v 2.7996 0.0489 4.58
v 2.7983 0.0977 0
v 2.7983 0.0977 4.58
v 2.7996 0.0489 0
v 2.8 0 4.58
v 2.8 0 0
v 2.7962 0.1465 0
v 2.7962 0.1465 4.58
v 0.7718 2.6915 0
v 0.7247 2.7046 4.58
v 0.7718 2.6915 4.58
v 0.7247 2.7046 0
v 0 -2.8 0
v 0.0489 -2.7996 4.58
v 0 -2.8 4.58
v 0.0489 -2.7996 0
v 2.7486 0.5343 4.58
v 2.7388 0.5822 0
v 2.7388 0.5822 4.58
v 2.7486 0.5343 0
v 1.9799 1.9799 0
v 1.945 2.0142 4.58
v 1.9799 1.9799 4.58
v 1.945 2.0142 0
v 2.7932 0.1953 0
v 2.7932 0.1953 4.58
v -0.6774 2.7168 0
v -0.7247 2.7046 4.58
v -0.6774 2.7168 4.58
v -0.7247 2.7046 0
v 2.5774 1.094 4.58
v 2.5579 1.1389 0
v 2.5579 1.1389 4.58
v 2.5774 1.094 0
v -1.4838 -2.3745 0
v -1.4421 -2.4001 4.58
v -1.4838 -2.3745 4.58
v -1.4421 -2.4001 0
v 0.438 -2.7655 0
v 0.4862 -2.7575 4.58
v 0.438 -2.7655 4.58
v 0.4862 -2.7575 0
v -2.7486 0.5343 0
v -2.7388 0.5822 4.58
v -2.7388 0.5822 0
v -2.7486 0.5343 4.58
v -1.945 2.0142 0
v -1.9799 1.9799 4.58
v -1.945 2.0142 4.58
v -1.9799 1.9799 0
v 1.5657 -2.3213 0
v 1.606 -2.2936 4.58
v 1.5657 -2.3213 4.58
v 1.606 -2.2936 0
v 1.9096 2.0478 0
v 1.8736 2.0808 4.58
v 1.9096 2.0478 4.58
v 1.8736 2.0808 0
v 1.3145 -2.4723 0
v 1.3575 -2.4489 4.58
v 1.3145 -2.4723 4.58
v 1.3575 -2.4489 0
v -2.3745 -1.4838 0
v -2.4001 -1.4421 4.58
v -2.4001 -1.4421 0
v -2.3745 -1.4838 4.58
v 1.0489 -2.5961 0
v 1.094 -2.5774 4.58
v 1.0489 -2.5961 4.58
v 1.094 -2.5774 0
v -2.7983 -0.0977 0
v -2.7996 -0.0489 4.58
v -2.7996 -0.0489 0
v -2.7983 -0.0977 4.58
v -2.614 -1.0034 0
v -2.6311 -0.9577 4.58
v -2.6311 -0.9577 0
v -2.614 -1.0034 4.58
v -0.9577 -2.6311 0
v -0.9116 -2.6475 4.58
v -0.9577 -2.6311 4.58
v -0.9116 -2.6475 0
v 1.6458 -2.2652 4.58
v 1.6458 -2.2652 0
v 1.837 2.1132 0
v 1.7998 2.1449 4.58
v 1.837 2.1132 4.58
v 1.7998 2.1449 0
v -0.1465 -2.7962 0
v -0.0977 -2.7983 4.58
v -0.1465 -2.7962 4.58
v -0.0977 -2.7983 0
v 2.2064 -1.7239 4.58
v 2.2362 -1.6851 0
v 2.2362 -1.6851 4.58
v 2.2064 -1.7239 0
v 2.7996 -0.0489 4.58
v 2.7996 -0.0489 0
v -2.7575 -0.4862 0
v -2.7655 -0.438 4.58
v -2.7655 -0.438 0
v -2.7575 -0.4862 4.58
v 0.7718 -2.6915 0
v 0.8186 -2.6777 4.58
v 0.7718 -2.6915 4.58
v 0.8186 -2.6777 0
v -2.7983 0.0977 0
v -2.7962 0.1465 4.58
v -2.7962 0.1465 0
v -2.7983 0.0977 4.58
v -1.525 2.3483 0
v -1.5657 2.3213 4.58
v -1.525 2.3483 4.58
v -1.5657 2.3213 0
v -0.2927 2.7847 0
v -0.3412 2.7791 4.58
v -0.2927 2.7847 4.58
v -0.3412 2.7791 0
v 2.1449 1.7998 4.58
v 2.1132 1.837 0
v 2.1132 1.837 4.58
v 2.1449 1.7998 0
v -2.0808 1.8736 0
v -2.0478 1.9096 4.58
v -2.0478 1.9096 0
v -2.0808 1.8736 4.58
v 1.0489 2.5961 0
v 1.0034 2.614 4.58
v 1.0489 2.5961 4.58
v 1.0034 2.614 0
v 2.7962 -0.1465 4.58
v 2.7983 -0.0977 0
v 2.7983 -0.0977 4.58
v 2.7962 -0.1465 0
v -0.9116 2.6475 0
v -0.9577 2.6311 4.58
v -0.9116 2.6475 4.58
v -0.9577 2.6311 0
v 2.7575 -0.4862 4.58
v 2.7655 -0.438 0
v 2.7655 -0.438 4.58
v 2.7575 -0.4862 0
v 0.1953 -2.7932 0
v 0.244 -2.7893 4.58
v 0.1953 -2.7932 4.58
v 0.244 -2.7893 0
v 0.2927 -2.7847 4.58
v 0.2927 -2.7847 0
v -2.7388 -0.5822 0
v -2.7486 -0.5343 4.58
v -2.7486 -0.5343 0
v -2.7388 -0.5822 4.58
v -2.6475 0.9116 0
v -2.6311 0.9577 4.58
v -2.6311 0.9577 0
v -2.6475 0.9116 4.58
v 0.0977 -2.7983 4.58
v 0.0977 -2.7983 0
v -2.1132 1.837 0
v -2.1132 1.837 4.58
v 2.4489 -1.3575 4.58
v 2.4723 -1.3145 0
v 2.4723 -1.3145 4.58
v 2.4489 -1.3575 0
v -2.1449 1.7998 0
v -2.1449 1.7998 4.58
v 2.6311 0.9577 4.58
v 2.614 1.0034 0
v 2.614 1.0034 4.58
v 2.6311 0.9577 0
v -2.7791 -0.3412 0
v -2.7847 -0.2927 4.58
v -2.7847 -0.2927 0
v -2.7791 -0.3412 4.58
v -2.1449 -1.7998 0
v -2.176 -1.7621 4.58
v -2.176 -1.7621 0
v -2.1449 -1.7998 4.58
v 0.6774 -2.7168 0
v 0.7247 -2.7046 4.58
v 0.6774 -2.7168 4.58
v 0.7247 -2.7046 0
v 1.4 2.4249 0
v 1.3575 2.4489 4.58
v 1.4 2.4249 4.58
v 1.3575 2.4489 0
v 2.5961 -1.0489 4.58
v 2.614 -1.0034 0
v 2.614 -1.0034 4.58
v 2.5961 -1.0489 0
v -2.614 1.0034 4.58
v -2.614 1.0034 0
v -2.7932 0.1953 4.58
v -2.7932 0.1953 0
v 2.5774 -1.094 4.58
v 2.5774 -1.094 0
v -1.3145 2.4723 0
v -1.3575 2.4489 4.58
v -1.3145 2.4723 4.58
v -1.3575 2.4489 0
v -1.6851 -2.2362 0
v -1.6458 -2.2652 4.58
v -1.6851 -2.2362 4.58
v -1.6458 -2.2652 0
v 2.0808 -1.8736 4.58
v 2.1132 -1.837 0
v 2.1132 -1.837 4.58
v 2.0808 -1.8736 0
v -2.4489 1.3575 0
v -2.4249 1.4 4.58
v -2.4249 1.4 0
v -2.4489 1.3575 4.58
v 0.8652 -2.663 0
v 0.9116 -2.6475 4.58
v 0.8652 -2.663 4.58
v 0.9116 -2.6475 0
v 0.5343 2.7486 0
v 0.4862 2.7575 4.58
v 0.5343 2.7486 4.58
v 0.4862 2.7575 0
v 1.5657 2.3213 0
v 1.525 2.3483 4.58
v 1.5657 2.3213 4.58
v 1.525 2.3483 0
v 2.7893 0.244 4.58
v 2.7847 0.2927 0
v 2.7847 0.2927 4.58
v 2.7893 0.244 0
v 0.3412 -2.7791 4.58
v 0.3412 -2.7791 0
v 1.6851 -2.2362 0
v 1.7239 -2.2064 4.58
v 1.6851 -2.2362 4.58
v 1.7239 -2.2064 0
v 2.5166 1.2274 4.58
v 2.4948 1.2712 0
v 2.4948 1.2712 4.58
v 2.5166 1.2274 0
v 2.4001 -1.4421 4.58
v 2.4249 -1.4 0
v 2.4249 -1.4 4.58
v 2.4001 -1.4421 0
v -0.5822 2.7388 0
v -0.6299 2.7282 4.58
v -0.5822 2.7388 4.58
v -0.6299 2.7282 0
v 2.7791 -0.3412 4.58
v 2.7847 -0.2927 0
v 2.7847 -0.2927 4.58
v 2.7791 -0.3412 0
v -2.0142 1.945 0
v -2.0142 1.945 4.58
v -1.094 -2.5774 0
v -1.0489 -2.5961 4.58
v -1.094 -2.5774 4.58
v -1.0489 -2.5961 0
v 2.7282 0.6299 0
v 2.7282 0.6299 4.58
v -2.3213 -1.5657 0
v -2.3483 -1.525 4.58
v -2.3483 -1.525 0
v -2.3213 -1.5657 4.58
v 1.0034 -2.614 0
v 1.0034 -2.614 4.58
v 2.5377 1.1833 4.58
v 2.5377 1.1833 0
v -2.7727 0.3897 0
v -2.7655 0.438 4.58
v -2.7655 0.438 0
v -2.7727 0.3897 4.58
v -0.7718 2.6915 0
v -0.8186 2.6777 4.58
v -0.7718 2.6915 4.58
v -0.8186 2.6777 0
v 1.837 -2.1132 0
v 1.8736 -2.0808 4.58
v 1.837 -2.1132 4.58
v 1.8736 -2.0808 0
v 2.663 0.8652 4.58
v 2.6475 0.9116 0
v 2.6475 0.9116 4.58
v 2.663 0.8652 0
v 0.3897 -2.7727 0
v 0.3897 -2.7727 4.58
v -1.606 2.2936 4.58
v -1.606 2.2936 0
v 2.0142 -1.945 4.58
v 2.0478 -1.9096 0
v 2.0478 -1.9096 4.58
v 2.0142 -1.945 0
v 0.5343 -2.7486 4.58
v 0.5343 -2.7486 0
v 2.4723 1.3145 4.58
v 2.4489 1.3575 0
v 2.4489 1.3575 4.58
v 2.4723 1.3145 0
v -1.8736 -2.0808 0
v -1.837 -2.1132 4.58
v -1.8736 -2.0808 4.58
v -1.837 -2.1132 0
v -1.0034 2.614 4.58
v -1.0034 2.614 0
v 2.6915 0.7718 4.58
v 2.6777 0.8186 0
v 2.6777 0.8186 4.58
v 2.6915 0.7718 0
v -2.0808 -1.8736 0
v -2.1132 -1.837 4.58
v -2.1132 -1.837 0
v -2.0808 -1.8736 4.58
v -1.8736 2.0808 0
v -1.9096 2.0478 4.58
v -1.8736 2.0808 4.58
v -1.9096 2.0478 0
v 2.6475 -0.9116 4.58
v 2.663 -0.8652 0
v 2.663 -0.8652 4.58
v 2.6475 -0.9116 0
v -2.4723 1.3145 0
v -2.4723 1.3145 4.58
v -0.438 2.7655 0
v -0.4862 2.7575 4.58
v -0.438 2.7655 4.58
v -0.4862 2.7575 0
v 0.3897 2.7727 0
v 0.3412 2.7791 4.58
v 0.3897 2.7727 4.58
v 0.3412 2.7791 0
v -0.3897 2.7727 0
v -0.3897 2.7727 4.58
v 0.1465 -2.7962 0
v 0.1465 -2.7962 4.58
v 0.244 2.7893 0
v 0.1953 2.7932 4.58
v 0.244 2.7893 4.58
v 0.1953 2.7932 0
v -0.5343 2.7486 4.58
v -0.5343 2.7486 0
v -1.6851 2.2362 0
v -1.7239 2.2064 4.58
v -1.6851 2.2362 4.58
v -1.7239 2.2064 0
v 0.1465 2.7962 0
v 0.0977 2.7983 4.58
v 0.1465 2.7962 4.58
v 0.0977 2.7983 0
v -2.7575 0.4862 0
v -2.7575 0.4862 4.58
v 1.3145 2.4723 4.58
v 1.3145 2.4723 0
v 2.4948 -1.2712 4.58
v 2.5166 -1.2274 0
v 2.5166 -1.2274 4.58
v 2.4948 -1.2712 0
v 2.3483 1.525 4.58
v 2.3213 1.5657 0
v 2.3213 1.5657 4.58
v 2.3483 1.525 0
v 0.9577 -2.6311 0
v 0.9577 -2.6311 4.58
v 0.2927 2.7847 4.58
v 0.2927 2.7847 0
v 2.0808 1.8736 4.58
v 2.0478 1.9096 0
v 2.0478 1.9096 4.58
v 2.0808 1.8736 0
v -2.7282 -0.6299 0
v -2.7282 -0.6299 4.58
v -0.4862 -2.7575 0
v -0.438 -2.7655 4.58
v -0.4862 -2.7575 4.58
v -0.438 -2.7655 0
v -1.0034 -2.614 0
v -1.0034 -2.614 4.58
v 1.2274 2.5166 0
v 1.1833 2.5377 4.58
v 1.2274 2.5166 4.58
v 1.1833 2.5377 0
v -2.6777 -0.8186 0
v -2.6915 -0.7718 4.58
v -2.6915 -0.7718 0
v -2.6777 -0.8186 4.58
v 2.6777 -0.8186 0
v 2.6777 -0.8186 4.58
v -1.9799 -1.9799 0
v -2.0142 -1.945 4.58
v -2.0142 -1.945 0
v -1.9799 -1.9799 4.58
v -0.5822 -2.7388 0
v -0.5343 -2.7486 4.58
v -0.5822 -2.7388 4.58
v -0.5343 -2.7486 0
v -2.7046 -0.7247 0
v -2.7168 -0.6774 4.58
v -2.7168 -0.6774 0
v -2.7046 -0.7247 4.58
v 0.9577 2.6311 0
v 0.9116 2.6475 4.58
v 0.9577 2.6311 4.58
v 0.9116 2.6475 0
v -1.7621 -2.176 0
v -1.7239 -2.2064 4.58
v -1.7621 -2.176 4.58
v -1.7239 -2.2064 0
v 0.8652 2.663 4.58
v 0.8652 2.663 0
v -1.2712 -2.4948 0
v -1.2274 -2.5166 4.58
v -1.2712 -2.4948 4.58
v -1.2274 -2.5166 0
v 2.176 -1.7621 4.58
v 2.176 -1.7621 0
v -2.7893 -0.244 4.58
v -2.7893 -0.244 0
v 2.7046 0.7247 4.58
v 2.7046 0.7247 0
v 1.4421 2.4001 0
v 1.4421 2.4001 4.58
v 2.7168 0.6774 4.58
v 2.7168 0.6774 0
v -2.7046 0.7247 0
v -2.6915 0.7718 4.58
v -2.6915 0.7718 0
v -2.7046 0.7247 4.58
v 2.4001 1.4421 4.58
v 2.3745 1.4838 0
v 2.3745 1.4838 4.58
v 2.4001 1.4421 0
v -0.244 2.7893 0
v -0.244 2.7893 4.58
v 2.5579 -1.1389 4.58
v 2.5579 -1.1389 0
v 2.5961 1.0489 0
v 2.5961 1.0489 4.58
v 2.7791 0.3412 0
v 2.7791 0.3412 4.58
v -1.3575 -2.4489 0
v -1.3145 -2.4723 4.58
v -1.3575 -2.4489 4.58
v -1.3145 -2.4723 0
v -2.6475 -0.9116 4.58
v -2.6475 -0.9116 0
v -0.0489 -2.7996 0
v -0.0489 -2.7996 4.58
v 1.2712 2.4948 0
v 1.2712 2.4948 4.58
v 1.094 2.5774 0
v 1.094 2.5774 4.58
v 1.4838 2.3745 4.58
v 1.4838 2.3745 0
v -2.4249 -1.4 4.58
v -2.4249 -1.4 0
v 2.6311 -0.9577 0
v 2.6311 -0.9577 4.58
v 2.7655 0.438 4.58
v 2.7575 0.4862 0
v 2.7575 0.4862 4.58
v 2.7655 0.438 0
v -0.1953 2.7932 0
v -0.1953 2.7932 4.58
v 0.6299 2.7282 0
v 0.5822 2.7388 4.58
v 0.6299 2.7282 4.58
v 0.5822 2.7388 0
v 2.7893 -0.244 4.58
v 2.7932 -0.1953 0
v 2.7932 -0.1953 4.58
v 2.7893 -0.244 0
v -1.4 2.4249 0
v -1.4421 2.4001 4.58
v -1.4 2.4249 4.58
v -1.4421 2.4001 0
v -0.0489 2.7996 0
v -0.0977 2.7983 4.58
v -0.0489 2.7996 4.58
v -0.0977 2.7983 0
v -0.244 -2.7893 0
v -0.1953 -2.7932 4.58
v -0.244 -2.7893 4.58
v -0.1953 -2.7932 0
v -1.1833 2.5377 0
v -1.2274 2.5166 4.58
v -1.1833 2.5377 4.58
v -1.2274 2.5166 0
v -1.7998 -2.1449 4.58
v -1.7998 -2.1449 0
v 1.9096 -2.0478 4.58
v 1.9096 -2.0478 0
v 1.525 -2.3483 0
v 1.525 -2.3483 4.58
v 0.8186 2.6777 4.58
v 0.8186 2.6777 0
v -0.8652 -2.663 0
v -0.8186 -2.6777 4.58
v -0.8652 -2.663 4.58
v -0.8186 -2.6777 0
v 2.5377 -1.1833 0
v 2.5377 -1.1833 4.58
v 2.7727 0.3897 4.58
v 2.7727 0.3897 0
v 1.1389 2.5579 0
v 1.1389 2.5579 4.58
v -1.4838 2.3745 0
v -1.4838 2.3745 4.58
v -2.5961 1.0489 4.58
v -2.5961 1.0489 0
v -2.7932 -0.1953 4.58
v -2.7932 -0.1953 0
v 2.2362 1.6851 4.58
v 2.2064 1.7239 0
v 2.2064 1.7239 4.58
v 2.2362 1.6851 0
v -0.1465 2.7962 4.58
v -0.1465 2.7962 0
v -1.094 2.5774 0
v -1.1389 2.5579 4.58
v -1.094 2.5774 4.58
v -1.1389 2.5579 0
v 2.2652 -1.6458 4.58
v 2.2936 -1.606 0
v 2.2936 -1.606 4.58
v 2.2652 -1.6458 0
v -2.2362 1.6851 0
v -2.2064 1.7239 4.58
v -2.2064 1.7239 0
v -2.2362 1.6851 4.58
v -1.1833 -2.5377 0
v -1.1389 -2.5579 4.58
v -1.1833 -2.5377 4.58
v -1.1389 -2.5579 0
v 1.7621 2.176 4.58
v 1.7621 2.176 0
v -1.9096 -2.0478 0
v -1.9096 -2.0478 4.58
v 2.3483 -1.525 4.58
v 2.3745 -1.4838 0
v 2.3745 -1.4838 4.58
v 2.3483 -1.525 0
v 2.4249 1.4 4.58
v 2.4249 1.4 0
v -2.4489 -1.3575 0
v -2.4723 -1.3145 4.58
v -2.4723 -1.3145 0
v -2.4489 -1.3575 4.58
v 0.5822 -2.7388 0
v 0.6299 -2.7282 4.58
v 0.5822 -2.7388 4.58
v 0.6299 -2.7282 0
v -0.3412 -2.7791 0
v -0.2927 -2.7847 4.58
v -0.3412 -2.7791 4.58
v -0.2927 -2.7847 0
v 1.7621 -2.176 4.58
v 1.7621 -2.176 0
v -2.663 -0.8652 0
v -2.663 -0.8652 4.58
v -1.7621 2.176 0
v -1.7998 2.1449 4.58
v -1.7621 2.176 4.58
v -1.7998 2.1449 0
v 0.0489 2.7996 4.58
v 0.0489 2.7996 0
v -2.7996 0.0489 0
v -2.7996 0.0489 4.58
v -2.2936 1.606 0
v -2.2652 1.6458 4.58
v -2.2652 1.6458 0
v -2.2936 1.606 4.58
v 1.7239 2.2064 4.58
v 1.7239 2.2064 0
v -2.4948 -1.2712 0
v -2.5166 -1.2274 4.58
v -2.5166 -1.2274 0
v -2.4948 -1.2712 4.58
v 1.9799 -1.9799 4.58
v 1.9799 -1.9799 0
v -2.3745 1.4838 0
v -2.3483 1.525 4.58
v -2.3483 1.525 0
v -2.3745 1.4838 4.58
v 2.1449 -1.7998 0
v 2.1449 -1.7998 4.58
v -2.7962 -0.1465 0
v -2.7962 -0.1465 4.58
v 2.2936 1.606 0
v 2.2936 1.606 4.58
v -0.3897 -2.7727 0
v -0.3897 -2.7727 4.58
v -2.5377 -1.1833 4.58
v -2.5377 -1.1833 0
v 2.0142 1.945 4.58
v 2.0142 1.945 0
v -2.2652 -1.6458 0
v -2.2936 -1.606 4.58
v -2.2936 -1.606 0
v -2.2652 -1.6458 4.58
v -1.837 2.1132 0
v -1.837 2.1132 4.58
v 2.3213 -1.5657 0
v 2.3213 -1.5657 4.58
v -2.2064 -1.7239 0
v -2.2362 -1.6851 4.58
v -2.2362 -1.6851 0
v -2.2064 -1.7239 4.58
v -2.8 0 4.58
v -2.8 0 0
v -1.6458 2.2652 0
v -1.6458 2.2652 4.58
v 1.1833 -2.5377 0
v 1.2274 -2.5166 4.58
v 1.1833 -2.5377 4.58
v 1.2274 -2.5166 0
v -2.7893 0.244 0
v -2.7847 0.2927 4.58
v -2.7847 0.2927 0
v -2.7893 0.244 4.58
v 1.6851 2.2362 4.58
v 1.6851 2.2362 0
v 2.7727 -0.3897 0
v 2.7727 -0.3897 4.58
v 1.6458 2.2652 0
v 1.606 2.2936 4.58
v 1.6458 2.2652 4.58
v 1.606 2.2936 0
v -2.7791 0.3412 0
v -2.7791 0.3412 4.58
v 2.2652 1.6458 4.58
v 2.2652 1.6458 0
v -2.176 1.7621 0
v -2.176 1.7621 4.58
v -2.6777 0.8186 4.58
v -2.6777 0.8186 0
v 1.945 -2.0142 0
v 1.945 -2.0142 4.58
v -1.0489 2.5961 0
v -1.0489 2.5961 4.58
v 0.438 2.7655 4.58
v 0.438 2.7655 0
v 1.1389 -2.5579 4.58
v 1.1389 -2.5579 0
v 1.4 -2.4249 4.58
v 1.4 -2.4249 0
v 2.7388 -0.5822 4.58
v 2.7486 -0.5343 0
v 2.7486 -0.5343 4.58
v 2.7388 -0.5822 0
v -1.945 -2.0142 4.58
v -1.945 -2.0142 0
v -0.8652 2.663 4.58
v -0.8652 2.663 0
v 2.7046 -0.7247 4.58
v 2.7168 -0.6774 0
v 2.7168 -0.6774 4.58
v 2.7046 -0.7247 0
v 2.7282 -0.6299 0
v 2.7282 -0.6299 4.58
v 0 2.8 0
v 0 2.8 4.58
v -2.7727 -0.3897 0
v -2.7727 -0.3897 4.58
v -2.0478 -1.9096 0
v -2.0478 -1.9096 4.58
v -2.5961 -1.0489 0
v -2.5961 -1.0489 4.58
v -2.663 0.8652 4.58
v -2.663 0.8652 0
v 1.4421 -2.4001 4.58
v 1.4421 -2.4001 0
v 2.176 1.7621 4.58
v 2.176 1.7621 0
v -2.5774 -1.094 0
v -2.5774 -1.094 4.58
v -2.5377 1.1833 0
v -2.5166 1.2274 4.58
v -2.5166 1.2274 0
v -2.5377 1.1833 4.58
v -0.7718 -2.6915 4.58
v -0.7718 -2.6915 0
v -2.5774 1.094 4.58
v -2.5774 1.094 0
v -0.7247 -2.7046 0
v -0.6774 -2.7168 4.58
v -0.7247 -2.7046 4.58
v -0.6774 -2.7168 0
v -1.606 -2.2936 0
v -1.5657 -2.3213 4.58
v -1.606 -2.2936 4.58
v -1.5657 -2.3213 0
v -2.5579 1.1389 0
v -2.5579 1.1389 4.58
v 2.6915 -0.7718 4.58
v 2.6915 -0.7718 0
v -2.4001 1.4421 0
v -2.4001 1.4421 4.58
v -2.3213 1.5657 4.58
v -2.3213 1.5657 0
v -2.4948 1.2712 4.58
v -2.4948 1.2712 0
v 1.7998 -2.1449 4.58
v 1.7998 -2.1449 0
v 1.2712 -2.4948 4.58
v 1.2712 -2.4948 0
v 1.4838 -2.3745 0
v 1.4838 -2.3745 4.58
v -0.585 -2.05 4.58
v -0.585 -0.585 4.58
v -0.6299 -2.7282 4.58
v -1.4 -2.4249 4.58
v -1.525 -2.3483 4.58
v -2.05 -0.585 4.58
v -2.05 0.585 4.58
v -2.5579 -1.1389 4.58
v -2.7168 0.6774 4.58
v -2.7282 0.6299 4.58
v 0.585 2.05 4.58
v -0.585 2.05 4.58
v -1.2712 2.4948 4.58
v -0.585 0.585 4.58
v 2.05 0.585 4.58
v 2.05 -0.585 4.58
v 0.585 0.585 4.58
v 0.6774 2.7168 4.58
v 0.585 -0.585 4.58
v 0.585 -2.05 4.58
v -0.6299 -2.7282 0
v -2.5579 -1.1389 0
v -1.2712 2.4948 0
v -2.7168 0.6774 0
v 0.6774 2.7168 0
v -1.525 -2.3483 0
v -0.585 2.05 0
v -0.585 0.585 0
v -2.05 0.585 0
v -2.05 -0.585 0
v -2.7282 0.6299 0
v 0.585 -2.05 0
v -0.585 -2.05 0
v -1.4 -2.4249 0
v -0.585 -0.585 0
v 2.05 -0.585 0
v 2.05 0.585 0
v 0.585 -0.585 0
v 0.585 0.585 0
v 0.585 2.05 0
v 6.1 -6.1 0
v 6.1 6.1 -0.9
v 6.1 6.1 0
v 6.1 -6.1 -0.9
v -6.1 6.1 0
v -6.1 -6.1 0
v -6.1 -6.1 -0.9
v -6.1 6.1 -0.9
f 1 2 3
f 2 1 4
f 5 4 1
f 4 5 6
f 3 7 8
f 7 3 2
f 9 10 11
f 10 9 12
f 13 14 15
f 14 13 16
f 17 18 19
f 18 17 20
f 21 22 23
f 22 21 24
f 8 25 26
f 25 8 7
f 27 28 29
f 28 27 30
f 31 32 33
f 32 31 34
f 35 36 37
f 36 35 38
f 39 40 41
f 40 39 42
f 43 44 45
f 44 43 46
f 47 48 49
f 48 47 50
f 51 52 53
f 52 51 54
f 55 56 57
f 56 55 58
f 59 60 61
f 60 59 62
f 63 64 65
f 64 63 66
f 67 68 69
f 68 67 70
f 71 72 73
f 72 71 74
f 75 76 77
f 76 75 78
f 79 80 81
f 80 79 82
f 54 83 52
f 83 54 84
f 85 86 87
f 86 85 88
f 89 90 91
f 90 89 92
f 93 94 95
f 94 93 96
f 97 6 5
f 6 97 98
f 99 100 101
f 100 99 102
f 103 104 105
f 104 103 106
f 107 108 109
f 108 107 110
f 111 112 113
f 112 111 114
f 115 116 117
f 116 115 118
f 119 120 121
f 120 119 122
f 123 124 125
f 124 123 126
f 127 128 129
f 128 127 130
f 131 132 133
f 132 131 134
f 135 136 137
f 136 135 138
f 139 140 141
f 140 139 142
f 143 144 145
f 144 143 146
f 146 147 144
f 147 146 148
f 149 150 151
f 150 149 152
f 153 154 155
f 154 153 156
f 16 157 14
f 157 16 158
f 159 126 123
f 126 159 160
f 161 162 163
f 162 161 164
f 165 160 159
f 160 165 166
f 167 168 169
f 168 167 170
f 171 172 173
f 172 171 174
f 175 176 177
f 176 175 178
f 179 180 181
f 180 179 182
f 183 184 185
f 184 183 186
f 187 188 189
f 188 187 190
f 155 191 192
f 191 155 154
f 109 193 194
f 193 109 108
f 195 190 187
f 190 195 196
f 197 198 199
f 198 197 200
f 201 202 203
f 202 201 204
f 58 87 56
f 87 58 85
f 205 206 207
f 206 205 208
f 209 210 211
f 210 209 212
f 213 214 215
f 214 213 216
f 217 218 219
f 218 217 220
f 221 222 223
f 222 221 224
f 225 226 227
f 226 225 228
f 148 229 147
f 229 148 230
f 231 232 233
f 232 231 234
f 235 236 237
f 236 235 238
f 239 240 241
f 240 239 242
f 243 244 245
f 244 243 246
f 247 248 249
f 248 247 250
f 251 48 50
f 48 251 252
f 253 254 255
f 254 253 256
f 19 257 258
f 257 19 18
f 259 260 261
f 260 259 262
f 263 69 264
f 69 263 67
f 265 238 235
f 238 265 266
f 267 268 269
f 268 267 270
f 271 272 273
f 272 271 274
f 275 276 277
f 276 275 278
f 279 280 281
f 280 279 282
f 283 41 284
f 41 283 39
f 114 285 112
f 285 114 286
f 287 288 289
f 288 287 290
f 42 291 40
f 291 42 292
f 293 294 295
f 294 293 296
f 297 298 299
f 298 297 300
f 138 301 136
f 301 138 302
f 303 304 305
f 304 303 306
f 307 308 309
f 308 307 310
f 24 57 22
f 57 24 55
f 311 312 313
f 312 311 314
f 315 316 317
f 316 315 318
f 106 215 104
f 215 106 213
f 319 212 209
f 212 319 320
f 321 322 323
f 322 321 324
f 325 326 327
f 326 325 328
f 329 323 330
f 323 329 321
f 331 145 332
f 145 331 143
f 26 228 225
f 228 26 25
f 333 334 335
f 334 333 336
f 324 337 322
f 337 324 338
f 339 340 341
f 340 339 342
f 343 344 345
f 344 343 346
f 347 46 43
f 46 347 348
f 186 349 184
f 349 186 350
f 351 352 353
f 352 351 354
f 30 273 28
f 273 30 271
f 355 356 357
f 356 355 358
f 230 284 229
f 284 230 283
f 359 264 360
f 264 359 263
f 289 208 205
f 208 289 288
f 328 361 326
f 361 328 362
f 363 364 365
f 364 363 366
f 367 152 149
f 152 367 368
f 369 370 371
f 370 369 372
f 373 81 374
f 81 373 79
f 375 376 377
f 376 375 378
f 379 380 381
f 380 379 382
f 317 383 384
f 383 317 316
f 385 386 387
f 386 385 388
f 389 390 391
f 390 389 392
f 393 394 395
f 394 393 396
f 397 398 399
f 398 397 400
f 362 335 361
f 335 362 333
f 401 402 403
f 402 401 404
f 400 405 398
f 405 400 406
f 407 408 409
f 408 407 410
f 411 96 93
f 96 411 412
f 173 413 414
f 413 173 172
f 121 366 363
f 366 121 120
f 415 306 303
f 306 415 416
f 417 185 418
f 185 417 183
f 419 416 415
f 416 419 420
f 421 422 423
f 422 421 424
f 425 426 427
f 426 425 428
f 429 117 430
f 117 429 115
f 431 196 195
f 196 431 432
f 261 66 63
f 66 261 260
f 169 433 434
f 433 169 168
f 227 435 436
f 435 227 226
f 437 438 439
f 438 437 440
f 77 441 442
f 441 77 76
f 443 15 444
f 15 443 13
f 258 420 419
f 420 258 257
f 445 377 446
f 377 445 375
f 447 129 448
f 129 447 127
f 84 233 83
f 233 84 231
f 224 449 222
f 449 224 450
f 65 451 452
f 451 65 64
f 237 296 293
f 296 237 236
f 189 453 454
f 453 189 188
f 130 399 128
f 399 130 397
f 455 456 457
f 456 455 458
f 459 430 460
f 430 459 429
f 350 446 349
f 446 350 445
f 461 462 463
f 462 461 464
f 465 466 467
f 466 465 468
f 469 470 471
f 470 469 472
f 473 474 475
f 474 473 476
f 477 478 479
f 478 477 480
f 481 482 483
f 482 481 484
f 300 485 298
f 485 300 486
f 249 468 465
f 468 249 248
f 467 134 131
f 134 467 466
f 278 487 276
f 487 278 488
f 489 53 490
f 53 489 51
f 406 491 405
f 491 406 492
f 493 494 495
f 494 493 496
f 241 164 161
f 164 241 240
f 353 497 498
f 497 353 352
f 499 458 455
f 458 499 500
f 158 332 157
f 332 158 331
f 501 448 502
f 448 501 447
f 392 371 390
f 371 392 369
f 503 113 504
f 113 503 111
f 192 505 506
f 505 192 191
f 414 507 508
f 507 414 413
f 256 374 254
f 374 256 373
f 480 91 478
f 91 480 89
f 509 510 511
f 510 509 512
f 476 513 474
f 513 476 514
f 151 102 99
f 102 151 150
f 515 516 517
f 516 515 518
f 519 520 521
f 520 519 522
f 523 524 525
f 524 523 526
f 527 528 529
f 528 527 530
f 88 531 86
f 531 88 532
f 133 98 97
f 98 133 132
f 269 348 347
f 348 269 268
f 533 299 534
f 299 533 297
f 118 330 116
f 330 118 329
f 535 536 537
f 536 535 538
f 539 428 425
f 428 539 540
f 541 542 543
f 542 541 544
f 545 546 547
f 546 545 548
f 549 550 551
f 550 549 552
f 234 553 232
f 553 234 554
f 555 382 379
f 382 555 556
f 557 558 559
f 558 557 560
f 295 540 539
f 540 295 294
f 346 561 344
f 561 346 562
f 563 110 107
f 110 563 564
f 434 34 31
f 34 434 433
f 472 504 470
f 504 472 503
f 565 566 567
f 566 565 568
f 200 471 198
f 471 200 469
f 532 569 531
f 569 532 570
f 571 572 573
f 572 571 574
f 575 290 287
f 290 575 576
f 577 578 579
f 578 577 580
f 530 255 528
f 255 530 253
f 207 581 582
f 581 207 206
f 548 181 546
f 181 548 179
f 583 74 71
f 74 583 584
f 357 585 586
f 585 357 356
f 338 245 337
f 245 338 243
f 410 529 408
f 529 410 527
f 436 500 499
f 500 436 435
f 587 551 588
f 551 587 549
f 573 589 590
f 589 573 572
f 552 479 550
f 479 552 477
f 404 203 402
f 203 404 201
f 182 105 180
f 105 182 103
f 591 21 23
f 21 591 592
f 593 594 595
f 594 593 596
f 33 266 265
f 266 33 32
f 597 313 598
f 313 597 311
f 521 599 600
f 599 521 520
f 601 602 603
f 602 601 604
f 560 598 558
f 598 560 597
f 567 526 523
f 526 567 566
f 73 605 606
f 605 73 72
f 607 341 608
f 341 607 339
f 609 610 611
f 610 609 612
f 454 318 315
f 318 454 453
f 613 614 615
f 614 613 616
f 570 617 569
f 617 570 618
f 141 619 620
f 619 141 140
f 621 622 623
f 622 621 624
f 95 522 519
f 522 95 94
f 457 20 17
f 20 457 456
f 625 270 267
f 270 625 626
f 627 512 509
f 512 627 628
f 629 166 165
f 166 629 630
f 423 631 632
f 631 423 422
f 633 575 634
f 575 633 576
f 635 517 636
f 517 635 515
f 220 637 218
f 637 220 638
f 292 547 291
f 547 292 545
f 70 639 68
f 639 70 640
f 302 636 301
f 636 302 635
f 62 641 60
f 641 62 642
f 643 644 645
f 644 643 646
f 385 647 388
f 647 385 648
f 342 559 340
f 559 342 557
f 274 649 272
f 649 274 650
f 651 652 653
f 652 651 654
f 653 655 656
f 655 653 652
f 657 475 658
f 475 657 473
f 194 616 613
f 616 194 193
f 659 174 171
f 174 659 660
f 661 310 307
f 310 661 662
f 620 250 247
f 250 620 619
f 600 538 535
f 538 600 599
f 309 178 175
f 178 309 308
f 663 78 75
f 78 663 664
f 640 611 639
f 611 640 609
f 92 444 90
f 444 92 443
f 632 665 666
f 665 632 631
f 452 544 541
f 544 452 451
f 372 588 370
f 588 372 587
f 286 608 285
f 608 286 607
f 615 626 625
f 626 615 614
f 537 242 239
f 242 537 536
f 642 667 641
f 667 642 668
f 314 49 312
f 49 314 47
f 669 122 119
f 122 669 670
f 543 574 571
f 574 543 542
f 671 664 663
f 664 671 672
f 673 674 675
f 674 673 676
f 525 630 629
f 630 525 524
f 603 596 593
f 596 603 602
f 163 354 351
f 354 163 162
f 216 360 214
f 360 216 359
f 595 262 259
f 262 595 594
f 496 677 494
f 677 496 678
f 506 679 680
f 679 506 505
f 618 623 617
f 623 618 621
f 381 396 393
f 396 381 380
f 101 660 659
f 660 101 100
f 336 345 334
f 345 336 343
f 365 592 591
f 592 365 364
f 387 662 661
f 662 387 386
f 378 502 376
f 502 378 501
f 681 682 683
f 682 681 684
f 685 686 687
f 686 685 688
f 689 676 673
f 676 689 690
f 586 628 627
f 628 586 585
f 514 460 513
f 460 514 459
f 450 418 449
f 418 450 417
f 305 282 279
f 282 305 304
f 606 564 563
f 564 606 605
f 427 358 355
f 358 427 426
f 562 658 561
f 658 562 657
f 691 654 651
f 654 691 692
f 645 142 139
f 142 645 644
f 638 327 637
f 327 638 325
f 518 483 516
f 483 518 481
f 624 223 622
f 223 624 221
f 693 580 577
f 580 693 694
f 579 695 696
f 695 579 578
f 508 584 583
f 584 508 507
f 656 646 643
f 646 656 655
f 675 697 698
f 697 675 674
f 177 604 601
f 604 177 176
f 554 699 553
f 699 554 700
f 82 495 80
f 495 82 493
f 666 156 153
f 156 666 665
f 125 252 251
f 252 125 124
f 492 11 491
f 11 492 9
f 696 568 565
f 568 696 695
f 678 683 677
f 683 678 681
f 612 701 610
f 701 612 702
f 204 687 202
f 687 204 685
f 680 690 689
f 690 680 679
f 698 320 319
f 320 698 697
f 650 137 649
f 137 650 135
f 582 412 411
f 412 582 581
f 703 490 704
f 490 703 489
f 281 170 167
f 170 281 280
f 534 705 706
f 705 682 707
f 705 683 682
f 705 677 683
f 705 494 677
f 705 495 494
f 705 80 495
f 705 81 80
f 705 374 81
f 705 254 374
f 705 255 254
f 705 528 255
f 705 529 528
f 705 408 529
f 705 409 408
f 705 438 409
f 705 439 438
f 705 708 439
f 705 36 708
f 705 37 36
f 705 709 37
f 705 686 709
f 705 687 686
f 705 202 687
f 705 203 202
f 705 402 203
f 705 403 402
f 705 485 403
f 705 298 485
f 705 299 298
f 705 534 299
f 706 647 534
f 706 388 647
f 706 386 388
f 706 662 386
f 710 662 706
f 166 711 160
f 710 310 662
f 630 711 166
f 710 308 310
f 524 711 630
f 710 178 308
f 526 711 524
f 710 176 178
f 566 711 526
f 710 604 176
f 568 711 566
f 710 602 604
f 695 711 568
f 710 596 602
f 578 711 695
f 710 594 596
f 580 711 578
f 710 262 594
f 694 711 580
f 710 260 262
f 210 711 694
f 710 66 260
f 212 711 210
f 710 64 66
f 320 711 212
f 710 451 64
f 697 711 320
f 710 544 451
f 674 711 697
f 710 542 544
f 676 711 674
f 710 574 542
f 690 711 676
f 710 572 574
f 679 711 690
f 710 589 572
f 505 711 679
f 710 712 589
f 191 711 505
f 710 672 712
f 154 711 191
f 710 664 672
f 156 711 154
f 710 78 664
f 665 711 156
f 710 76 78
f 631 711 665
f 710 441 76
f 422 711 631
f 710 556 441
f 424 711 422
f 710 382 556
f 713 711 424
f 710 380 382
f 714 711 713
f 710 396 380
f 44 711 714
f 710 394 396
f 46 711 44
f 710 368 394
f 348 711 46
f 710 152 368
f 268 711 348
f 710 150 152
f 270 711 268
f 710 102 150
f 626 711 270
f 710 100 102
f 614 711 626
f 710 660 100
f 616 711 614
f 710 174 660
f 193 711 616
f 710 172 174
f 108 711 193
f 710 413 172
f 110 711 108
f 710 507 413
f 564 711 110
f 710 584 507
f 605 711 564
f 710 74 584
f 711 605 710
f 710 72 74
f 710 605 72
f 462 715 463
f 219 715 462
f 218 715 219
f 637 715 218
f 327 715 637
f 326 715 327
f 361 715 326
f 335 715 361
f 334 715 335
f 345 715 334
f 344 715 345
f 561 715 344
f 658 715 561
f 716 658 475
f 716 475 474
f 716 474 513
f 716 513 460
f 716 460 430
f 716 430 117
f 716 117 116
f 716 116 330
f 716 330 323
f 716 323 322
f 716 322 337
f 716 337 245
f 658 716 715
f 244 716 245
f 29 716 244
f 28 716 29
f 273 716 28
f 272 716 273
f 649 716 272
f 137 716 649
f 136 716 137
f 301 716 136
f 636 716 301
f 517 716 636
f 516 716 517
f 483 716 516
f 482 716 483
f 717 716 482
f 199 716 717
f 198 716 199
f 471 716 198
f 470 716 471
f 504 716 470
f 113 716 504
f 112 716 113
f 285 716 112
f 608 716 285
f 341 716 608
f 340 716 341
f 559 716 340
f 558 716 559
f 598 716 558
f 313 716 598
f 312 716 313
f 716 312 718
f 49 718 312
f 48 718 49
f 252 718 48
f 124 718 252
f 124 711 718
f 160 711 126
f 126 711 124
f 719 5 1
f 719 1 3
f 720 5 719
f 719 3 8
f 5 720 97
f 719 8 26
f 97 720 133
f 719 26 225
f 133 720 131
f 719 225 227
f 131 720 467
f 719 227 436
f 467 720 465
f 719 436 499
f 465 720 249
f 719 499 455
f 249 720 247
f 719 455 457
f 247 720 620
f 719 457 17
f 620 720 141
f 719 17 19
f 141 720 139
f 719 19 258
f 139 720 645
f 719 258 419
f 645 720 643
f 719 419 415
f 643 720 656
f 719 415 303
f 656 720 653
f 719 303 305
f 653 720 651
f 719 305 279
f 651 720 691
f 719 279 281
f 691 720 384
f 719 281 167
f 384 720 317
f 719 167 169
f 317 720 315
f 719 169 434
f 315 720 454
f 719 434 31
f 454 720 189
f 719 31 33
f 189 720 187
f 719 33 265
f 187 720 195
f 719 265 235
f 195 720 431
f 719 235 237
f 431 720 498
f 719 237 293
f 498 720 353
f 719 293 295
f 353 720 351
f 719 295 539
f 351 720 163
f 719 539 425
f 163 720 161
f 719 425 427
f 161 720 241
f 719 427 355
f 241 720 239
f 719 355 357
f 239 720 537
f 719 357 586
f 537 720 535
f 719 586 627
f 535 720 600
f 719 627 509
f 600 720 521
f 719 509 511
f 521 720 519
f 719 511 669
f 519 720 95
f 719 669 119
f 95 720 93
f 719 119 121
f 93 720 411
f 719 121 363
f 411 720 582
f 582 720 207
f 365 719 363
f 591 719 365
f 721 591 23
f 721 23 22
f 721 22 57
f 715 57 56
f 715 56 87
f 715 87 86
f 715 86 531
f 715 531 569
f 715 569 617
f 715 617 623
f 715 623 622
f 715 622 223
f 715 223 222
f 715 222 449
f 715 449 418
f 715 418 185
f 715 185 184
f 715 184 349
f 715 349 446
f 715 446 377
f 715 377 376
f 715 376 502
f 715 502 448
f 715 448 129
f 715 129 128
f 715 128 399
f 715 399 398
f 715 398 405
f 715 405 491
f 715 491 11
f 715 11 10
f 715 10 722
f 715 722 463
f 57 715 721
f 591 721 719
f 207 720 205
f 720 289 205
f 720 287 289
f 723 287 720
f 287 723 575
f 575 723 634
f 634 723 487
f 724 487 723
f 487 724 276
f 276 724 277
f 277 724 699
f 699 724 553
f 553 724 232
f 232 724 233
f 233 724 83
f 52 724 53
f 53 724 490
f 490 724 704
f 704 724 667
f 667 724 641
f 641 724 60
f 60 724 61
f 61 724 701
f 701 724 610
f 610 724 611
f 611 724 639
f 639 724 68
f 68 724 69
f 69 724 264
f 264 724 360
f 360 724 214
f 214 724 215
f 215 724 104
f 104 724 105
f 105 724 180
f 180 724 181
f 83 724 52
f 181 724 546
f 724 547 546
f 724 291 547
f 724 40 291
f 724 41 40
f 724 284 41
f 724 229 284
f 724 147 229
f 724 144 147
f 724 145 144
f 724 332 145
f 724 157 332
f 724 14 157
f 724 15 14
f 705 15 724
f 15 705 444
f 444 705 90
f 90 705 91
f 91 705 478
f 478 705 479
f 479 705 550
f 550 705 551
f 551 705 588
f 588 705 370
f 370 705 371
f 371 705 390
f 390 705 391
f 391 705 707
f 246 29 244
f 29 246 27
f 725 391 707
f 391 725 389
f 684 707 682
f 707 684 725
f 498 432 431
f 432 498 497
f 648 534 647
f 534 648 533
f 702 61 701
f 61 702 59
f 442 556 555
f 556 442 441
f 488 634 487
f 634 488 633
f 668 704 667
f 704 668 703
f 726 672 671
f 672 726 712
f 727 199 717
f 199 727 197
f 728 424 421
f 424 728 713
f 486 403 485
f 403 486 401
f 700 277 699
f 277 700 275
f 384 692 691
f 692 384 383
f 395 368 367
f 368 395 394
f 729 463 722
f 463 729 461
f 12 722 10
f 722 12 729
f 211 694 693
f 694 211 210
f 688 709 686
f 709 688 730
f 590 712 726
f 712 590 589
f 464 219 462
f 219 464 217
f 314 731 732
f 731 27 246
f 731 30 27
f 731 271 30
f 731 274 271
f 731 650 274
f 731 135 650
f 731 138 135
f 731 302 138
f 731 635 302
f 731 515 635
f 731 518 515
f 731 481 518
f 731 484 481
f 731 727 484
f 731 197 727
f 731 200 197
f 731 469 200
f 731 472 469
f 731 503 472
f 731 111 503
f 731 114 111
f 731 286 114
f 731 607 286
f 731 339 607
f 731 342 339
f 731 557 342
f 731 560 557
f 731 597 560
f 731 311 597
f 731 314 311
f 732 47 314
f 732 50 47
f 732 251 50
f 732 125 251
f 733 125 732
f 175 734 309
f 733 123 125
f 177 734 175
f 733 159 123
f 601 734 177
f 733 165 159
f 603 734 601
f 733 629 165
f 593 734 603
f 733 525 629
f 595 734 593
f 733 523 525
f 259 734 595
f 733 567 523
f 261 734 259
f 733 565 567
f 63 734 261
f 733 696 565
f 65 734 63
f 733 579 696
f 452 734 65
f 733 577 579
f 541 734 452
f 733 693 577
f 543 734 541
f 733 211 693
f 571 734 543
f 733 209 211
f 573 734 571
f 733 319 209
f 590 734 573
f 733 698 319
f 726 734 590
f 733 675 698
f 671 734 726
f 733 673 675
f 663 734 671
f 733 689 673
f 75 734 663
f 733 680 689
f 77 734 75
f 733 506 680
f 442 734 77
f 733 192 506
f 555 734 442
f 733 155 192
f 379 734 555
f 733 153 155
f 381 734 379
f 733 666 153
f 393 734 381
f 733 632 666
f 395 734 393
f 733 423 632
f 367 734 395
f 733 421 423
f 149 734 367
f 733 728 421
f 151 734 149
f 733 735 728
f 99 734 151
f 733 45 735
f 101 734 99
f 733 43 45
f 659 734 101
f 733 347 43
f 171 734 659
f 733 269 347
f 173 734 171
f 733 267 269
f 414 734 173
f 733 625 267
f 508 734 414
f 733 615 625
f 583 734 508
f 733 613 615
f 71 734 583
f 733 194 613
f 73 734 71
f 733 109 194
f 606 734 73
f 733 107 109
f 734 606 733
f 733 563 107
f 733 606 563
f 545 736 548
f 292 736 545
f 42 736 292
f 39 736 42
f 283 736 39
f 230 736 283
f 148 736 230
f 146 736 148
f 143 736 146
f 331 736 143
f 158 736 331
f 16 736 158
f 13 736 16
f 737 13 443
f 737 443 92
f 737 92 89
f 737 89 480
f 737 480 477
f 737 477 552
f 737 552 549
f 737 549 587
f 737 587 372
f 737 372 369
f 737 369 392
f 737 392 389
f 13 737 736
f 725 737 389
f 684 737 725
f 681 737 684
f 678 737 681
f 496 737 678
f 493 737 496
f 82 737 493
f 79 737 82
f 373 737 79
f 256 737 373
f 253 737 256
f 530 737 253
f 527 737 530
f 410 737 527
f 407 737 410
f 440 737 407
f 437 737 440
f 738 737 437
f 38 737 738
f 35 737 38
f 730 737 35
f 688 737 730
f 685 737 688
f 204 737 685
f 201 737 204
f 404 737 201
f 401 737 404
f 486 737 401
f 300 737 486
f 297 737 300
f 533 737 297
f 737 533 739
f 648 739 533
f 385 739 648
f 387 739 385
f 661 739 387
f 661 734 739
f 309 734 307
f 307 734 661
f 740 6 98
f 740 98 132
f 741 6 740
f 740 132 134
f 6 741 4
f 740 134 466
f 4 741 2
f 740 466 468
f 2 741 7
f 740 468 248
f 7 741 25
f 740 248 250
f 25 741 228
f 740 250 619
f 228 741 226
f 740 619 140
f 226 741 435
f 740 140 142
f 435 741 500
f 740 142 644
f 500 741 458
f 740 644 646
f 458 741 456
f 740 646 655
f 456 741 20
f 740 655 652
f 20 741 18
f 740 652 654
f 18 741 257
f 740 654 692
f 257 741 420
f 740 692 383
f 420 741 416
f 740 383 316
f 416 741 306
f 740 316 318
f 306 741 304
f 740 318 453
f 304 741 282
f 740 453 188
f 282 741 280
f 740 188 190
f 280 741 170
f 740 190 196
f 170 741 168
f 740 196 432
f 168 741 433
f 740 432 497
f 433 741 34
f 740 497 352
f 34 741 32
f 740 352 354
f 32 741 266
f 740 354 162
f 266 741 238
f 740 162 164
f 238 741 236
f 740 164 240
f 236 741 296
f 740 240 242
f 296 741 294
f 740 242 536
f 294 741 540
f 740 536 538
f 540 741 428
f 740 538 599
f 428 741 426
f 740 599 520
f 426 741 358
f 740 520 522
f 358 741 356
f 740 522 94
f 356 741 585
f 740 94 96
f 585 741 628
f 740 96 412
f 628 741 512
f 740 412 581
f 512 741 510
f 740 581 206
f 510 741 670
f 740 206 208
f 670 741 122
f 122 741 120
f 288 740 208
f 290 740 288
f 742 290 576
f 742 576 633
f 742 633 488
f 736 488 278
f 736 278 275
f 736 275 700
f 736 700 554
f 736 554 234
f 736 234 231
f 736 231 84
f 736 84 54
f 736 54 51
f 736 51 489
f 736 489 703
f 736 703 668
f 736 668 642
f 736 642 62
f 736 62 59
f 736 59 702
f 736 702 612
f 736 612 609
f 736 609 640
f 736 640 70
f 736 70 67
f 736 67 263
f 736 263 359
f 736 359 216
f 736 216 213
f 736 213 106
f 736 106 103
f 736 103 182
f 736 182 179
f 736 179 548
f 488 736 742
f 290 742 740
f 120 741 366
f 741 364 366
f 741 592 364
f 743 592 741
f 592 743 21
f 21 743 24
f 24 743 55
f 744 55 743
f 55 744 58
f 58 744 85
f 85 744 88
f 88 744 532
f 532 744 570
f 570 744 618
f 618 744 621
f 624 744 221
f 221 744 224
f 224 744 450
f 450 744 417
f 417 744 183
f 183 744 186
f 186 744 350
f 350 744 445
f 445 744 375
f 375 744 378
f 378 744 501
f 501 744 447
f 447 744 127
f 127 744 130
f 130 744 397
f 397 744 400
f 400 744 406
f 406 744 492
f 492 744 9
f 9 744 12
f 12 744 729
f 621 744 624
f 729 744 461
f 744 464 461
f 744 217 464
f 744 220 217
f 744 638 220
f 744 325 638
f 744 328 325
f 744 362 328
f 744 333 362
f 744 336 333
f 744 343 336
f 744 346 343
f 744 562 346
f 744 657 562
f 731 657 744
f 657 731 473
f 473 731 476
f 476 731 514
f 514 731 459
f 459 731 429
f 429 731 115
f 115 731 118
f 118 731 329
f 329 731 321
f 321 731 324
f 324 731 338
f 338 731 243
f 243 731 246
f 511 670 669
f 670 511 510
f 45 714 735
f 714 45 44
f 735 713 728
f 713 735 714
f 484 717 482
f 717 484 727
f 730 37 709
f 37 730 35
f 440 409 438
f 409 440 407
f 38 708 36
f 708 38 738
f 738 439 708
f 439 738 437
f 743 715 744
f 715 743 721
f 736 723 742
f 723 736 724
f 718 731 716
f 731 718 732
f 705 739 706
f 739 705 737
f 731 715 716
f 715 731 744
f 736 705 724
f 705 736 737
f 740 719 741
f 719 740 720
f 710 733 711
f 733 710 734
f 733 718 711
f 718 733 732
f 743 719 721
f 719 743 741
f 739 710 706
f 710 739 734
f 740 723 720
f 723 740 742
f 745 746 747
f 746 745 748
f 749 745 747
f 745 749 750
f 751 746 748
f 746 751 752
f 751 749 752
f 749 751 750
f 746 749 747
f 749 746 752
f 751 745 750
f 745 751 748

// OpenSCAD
/**
* based on http://deskthority.net/w/images/c/c8/Cherry_MX_1%C3%971_keycap_specification_%281983%29.pdf
* TODO: find better source, and/or measure several brands.
*
* v.1
* 2014-May-26
*/

baseplate();
mx_mount();

/** a simple plane where to develop the keycap on top of
* NOTE: the depth of 0.95mm... it shouldn't matter because you should build
* your keycap on top of it. If not expanding the geometry with more plastic
* there, but instead using as a base for a wooden keycap cup or some
* other crazy idea, use the minimum your material/printer
* will be comfortable with
*/
module baseplate(){
	translate( [0,0, -0.9/2] )
		cube( size=[12.2,12.2,0.9], center=true );
}

/**
* The female part of the steam.
* NOTE: i'm not 100% sure on the height, as the drawing I found does not have
* it measured... and i can't infer it with full confidence when
* just accounting for the other measurements. the drawing os probably more
* concerned with the keycap per se.
*/
module mx_mount(){
	mx_height = 4.58; // measured from an actual CM storm cap
	translate( [0,0,mx_height/2] ){
		difference(){
			cylinder( h=mx_height, r=5.6/2, center=true, $fn=360 );
				cube( size=[1.17,4.1,mx_height+2], center=true );
				cube( size=[4.1,1.17,mx_height+2], center=true );
		}
	}
}
